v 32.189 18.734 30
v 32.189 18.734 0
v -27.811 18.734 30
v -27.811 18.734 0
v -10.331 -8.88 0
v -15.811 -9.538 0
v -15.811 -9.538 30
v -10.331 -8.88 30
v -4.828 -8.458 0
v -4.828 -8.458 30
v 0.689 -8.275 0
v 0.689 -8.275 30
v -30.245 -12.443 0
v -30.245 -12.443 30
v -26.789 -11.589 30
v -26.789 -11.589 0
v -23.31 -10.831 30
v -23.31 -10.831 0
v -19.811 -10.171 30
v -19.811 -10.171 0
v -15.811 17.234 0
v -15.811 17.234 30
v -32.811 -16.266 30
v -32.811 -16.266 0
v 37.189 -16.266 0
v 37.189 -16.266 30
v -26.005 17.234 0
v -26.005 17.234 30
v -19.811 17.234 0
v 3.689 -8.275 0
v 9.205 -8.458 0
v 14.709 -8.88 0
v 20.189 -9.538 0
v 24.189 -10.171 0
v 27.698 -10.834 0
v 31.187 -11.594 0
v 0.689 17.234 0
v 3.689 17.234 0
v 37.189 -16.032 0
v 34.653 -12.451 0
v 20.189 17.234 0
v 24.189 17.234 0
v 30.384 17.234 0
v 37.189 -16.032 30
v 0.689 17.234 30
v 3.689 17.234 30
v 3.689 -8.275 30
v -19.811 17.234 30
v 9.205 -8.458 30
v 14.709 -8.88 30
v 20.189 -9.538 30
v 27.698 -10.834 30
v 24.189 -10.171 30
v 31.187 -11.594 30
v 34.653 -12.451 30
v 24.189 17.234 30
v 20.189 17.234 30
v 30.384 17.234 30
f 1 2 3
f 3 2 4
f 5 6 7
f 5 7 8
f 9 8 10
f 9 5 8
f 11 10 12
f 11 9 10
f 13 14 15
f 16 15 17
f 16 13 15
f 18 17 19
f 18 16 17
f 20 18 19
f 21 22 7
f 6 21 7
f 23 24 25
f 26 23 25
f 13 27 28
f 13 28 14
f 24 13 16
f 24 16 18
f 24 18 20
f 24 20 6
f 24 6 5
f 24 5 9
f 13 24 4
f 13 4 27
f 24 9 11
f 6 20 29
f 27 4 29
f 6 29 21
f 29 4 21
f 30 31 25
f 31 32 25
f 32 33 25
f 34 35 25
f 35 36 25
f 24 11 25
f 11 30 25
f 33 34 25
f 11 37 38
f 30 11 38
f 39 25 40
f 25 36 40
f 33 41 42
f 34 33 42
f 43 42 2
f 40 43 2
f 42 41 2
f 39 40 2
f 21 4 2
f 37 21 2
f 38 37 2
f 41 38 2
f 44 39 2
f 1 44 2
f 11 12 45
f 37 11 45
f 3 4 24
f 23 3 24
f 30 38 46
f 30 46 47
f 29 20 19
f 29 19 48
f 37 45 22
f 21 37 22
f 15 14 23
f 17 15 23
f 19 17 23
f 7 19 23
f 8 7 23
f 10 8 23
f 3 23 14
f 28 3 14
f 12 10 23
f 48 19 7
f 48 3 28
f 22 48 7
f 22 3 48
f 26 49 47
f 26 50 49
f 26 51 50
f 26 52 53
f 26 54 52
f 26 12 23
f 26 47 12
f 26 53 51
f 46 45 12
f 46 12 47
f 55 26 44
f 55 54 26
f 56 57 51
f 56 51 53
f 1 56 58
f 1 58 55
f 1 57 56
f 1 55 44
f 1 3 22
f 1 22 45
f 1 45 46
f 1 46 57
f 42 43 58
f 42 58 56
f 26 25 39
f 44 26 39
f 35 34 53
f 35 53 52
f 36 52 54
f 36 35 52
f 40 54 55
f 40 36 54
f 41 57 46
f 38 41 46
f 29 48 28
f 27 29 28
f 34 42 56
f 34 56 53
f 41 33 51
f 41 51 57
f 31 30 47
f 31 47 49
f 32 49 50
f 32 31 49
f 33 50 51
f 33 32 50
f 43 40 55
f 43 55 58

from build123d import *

# Parameters (mm, degrees)
F2_DEPTH = 30
F4_DEPTH = 30
F6_DEPTH = 30


with BuildPart() as f2:
    # F1 (on face) → F2 (new body)
    with BuildSketch(Plane.XY):
        Polygon((-27.811348, 18.733989), (-32.811348, -16.266011), (37.188652, -16.266011), (37.188652, -16.031536), (32.188652, 18.733989), align=None)
    extrude(amount=F2_DEPTH)

    # F3 (on face) → F4 (join)
    with BuildSketch(Plane.XY):
        with BuildLine():
            Line((-32.811348, -16.266011), (37.188652, -16.266011))
            ThreePointArc((37.188652, -16.266011), (2.188652, -11.266011), (-32.811348, -16.266011))
        make_face()
    extrude(amount=F4_DEPTH)

    # F5 (on Top) → F6 (cut)
    with BuildSketch(Plane.XY):
        with BuildLine():
            ThreePointArc((-30.244943, -12.443307), (-25.051853, -11.198209), (-19.811348, -10.170808))
            Line((-19.811348, -10.170808), (-19.811348, 17.233989))
            Line((-19.811348, 17.233989), (-26.005329, 17.233989))
            Line((-26.005329, 17.233989), (-30.244943, -12.443307))
        make_face()
        with BuildLine():
            ThreePointArc((24.188652, -10.170808), (29.444778, -11.201613), (34.653178, -12.451413))
            Line((34.653178, -12.451413), (30.383804, 17.233989))
            Line((30.383804, 17.233989), (24.188652, 17.233989))
            Line((24.188652, 17.233989), (24.188652, -10.170808))
        make_face()
        with BuildLine():
            ThreePointArc((3.688652, -8.2748), (11.959086, -8.639451), (20.188652, -9.537955))
            Line((20.188652, -9.537955), (20.188652, 17.233989))
            Line((20.188652, 17.233989), (3.688652, 17.233989))
            Line((3.688652, 17.233989), (3.688652, -8.2748))
        make_face()
        with BuildLine():
            ThreePointArc((-15.811348, -9.537955), (-7.581783, -8.639451), (0.688652, -8.2748))
            Line((0.688652, -8.2748), (0.688652, 17.233989))
            Line((0.688652, 17.233989), (-15.811348, 17.233989))
            Line((-15.811348, 17.233989), (-15.811348, -9.537955))
        make_face()
    extrude(amount=F6_DEPTH, mode=Mode.SUBTRACT)


solid = f2.part
